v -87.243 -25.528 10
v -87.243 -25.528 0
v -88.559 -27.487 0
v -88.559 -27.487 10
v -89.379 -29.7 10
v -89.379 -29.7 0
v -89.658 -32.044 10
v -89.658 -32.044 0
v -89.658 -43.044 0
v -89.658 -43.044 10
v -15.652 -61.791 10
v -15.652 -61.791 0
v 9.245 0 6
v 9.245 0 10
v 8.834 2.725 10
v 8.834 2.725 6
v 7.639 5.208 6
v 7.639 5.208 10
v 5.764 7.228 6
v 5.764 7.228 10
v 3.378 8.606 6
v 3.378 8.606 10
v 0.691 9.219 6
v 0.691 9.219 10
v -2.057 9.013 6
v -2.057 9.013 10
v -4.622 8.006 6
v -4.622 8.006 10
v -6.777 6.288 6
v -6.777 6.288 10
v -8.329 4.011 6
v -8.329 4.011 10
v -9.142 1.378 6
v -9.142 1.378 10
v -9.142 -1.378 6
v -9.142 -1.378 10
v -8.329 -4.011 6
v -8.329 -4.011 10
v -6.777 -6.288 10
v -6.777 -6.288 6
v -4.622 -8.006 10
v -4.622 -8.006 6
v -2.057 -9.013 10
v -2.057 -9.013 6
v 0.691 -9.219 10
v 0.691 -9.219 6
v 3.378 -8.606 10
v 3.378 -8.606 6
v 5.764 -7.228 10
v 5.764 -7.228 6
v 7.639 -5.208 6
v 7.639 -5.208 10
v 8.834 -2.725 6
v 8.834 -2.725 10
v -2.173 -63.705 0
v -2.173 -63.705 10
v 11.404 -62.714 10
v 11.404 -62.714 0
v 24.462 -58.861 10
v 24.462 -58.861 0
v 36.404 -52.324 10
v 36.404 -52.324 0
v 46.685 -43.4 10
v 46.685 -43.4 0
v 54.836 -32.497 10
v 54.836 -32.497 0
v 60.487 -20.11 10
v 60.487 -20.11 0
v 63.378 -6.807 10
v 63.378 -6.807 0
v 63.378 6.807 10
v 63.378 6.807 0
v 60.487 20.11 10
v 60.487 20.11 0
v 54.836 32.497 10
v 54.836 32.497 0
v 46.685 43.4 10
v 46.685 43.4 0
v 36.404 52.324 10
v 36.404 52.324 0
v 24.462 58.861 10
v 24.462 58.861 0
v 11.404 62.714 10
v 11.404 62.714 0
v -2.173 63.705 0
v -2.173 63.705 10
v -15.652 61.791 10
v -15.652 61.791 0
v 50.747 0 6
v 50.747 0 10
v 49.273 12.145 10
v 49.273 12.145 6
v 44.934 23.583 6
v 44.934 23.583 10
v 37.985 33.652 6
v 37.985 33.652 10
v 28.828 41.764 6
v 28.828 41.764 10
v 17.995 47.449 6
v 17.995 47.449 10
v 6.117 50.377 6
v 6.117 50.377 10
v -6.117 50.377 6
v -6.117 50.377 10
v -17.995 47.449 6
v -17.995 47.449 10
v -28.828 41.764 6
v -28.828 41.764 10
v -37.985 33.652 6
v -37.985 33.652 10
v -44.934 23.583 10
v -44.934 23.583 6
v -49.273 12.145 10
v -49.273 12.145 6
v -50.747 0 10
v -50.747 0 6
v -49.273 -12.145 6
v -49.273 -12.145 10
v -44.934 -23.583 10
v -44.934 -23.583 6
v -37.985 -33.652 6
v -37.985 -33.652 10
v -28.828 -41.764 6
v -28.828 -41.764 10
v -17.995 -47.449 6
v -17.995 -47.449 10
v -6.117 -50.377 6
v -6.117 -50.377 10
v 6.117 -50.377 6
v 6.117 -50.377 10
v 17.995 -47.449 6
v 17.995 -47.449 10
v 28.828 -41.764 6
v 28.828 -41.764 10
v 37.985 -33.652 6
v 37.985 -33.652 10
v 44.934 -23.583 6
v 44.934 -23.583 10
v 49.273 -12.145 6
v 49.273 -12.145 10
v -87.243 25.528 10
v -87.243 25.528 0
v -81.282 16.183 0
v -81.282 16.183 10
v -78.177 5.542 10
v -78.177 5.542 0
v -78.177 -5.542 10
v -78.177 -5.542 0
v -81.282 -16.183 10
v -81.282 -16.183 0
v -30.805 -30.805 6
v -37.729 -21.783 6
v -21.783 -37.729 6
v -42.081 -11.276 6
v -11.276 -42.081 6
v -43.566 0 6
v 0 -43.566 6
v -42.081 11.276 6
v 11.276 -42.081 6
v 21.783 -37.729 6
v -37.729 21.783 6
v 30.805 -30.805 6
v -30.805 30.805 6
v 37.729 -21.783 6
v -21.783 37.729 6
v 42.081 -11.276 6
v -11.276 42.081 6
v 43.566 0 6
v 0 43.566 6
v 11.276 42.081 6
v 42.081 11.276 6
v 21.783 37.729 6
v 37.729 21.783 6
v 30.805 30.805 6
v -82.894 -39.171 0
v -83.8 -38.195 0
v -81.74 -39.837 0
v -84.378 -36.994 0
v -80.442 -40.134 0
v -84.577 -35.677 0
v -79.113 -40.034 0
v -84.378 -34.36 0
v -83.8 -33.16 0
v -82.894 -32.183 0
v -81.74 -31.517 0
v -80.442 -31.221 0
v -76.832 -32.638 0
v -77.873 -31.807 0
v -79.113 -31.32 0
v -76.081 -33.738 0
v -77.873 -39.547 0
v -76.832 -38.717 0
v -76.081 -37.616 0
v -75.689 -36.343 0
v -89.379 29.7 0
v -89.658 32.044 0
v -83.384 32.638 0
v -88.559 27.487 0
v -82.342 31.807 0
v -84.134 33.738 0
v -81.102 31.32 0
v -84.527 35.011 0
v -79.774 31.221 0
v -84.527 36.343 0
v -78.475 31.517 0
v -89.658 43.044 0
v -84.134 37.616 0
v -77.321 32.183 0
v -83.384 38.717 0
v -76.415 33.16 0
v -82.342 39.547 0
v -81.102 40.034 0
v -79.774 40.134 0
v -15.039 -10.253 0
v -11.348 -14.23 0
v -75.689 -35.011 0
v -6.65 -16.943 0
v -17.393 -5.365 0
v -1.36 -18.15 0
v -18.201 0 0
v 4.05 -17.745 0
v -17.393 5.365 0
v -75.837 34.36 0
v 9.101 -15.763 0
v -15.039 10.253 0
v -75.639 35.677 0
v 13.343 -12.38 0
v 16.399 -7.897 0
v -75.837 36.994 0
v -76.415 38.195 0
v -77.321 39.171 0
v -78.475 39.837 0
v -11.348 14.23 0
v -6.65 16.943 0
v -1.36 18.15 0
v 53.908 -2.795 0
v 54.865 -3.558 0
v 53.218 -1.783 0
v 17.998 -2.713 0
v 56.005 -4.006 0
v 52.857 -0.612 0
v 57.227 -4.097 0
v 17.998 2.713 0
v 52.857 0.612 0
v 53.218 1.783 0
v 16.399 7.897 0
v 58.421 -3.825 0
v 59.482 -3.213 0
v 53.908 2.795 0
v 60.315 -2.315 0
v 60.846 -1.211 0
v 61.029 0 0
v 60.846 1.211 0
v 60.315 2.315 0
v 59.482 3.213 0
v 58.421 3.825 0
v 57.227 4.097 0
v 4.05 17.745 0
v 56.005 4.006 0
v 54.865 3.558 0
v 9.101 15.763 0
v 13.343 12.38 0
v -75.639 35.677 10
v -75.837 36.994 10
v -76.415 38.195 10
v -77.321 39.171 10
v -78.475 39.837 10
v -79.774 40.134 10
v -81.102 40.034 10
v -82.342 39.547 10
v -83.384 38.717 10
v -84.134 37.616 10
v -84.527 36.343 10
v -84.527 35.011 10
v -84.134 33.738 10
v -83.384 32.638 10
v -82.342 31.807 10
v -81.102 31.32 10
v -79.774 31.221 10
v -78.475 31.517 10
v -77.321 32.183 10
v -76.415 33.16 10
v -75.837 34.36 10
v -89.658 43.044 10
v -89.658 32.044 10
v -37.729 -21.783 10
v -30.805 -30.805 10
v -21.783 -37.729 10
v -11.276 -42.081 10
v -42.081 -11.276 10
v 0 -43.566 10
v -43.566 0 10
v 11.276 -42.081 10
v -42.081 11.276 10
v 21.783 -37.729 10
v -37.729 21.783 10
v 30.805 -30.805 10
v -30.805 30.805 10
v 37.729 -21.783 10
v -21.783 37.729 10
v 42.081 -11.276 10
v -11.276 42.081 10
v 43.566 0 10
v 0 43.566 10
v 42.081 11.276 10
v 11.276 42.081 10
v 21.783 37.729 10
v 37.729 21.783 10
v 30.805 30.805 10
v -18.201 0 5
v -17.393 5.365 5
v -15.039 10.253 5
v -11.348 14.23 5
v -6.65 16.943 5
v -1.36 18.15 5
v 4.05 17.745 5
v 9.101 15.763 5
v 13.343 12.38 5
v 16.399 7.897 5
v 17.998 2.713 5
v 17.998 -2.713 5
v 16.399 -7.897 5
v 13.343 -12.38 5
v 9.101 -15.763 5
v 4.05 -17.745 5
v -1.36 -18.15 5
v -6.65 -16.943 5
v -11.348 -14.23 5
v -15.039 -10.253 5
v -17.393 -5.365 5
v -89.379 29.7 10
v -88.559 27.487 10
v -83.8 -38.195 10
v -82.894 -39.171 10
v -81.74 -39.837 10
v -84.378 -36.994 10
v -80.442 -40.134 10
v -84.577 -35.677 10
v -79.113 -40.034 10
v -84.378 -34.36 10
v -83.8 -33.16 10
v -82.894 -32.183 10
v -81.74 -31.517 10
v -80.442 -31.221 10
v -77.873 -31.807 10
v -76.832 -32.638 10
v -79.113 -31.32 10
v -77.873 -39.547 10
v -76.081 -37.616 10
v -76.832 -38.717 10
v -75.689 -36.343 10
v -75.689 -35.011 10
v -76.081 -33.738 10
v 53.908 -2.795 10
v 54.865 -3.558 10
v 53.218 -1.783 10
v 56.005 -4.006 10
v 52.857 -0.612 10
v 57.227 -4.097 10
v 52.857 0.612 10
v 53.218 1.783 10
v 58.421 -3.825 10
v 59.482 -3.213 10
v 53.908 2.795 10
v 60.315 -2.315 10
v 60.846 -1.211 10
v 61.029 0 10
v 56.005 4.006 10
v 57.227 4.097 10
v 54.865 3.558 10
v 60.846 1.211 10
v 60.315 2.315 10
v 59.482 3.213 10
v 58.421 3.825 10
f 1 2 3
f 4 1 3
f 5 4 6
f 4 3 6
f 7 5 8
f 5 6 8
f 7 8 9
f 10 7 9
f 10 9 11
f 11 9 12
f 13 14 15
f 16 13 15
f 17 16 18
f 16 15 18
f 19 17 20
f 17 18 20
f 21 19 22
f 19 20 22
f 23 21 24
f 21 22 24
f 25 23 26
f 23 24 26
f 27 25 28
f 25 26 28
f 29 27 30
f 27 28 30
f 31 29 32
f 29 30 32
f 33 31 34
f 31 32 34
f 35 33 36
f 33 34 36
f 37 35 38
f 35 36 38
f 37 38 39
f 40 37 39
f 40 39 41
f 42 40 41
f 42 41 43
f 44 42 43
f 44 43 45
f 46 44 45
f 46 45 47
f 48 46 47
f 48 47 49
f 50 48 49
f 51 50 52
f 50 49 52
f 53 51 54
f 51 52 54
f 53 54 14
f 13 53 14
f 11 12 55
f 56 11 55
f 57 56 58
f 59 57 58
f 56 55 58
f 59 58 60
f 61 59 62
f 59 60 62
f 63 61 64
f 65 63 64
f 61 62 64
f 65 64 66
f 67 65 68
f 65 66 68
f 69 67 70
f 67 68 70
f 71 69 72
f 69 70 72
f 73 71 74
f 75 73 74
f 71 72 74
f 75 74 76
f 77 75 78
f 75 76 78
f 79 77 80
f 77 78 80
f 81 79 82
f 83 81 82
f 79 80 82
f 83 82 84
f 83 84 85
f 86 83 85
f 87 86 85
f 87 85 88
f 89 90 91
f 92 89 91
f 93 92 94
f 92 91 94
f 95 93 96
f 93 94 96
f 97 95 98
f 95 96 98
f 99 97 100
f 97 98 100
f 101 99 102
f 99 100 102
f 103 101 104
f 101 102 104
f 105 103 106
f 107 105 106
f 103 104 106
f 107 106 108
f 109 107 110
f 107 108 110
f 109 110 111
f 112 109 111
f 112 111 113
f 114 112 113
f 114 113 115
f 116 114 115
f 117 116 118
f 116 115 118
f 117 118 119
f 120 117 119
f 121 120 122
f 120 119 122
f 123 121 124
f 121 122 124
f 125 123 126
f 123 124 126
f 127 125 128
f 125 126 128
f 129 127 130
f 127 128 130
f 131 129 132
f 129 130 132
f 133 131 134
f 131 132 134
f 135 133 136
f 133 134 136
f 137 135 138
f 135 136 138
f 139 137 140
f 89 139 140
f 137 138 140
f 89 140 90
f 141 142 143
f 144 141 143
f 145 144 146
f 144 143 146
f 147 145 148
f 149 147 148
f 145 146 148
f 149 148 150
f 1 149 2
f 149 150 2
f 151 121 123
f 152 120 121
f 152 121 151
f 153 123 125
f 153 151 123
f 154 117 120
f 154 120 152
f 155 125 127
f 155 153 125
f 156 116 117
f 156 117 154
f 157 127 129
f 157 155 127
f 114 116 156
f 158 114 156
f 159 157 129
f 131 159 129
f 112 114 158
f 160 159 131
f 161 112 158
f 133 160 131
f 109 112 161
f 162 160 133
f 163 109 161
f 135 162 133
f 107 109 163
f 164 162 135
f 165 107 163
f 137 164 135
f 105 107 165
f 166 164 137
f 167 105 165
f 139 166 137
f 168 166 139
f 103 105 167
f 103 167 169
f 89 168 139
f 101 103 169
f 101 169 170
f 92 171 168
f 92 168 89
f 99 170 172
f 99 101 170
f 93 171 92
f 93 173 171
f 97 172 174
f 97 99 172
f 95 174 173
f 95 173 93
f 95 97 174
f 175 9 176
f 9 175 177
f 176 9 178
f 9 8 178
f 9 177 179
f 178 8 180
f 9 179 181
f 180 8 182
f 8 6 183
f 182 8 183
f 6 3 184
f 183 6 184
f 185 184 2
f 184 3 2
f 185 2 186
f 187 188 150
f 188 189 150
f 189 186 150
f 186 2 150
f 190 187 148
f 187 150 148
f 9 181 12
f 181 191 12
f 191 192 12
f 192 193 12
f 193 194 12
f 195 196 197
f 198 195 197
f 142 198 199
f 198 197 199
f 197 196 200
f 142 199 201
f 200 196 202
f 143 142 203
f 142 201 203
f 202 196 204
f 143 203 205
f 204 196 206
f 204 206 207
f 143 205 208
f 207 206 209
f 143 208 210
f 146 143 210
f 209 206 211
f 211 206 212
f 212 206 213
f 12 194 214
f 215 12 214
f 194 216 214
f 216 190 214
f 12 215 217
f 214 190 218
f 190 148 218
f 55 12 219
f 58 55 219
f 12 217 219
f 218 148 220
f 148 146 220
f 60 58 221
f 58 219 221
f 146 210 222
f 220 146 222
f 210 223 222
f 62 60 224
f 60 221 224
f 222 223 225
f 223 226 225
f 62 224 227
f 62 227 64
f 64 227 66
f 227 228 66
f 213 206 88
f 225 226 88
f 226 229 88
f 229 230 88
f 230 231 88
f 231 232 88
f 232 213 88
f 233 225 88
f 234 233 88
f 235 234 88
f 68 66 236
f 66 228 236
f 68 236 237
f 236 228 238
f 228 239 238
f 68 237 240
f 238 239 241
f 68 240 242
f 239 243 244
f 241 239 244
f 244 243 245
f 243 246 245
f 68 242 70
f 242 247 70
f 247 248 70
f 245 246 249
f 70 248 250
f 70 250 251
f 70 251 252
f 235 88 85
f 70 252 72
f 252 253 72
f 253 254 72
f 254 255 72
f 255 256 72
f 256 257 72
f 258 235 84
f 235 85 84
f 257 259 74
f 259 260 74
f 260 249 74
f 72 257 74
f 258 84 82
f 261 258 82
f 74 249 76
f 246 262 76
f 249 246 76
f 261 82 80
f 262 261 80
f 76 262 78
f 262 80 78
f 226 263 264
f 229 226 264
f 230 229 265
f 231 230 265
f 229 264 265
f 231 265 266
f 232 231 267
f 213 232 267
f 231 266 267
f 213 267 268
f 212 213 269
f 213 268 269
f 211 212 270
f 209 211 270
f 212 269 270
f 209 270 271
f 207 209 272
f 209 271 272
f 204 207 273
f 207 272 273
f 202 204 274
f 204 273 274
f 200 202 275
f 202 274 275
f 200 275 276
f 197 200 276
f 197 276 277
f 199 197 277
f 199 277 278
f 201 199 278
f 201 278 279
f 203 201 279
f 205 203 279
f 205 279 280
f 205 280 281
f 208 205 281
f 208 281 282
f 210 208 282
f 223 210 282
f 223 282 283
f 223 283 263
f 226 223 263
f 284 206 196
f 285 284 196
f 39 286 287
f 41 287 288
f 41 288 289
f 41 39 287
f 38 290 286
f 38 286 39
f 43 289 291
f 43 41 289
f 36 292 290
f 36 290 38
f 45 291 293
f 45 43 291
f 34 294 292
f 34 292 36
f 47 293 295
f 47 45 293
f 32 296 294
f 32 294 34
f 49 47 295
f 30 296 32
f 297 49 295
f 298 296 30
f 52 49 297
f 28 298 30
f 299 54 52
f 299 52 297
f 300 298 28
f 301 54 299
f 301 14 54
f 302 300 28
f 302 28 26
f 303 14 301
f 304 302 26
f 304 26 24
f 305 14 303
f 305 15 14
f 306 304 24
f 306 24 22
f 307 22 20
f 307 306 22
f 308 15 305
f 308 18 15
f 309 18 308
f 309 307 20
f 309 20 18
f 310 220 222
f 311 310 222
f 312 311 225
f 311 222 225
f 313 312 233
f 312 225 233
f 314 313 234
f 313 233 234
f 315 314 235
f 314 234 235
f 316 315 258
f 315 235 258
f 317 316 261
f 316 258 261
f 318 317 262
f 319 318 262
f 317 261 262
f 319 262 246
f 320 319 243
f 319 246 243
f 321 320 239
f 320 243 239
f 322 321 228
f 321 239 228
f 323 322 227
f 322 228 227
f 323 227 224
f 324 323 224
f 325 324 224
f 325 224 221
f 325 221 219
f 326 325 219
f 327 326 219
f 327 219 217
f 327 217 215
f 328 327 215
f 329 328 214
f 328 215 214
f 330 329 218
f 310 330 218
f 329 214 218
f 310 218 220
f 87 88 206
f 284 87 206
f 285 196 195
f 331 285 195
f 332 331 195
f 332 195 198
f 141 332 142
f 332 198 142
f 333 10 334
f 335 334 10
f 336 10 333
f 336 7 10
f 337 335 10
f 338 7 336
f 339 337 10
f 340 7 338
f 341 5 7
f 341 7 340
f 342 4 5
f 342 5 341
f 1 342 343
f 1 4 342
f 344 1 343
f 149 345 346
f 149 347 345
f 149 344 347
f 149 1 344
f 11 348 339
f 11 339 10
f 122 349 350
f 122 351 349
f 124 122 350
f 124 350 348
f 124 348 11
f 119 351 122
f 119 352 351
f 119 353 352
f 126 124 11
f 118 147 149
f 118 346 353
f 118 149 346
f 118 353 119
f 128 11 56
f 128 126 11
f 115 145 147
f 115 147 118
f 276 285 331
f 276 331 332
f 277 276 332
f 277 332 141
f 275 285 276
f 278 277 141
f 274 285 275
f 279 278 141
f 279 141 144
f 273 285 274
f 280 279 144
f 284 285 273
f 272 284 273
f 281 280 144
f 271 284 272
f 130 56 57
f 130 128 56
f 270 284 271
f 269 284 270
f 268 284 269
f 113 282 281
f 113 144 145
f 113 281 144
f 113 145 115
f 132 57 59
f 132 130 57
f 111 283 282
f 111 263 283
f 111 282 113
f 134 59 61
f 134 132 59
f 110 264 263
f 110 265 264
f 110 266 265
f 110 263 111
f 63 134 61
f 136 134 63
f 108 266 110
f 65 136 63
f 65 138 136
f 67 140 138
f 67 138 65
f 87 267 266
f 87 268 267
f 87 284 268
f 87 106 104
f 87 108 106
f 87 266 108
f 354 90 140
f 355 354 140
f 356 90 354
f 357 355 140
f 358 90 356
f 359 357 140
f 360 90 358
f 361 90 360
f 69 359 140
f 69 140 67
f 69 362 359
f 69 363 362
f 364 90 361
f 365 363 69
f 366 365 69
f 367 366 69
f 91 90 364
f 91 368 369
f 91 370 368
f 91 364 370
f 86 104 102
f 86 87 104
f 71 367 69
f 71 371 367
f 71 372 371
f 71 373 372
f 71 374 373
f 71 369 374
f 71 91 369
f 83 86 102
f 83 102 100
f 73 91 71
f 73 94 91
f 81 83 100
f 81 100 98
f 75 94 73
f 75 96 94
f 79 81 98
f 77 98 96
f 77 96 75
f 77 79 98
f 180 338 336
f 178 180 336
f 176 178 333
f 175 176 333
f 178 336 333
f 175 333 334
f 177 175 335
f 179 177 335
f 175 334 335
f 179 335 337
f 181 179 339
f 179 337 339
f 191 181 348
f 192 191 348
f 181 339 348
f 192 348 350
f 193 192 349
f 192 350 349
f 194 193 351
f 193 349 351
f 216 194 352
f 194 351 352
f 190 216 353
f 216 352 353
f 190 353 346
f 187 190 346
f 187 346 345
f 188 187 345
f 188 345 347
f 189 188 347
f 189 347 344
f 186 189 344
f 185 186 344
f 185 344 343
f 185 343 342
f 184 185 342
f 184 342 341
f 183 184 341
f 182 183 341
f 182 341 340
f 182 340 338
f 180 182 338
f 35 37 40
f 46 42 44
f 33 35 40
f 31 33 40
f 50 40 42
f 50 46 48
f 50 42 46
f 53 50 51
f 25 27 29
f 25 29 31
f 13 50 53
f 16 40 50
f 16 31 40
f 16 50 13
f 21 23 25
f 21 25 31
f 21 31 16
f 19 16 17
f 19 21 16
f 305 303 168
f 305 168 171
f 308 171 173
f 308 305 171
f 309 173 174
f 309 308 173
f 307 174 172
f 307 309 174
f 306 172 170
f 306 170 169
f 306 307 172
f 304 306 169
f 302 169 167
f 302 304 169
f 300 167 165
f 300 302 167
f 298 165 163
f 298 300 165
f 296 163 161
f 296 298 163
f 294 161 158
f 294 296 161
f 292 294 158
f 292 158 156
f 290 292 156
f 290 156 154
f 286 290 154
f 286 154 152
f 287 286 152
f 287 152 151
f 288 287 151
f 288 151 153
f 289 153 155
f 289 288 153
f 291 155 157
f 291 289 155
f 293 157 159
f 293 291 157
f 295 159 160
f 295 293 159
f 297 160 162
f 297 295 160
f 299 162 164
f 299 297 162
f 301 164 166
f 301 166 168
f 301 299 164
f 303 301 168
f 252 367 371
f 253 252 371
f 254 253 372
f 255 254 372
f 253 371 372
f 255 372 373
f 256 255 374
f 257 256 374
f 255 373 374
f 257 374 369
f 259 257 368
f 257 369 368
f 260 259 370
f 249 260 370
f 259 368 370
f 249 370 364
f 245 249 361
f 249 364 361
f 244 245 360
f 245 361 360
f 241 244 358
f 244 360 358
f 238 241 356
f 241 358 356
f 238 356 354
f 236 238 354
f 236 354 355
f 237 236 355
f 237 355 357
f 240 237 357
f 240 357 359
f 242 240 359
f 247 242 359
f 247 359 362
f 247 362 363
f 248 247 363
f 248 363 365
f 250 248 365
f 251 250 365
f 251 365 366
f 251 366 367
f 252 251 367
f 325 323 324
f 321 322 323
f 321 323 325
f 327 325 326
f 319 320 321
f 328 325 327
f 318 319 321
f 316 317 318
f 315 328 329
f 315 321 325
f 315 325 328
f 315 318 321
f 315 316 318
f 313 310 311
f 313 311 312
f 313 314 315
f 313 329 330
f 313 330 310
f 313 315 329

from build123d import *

# Parameters (mm, degrees)
EXTRUDE_1_DEPTH     = 10
SKETCH_2_R          = 4.468909074
SKETCH_2_R_2        = 4.108968286
CUT_EXTRUDE_1_DEPTH = 111.460779809
SKETCH_3_R          = 50.74720983
SKETCH_3_R_2        = 43.56554387
CUT_EXTRUDE_3_DEPTH = 4
SKETCH_4_R          = 9.24493497
CUT_EXTRUDE_4_DEPTH = 4
SKETCH_5_R          = 18.201318997
CUT_EXTRUDE_5_DEPTH = 5


with BuildPart() as part:
    # 草图1 → 凸台-拉伸1 (new body)
    with BuildSketch(Plane.XY):
        with BuildLine():
            Line((-89.657800503, -43.044325296), (-15.652055073, -61.790580648))
            ThreePointArc((-15.652055073, -61.790580648), (63.74215783, 0), (-15.652055073, 61.790580648))
            Line((-15.652055073, 61.790580648), (-89.657800503, 43.044325296))
            Line((-89.657800503, 43.044325296), (-89.657800503, 32.044242854))
            ThreePointArc((-89.657800503, 32.044242854), (-89.034636537, 28.569340555), (-87.242811306, 25.527525035))
            ThreePointArc((-87.242811306, 25.527525035), (-77.782727423, 0), (-87.242811306, -25.527525035))
            ThreePointArc((-87.242811306, -25.527525035), (-89.034636537, -28.569340555), (-89.657800503, -32.044242854))
            Line((-89.657800503, -32.044242854), (-89.657800503, -43.044325296))
        make_face()
    extrude(amount=EXTRUDE_1_DEPTH)

    # 草图2 → 切除-拉伸1 (cut, through all)
    with BuildSketch(Plane.XY.offset(10)):
        with Locations((-80.107707578, 35.677130973)):
            Circle(SKETCH_2_R)
        with Locations(Location((-80.107707578, -35.677130973, 0), (0, 0, 180))):
            Circle(SKETCH_2_R)
        with Locations((56.919679182, 0)):
            Circle(SKETCH_2_R_2)
    extrude(amount=-CUT_EXTRUDE_1_DEPTH, mode=Mode.SUBTRACT)

    # 草图3 → 切除-拉伸3 (cut)
    with BuildSketch(Plane.XY.offset(10)):
        Circle(SKETCH_3_R)
        Circle(SKETCH_3_R_2, mode=Mode.SUBTRACT)
    extrude(amount=-CUT_EXTRUDE_3_DEPTH, mode=Mode.SUBTRACT)

    # 草图4 → 切除-拉伸4 (cut)
    with BuildSketch(Plane.XY.offset(10)):
        Circle(SKETCH_4_R)
    extrude(amount=-CUT_EXTRUDE_4_DEPTH, mode=Mode.SUBTRACT)

    # 草图5 → 切除-拉伸5 (cut)
    with BuildSketch(Plane(origin=(0, 0, 0), x_dir=(-1, 0, 0), z_dir=(0, 0, -1))):
        Circle(SKETCH_5_R)
    extrude(amount=-CUT_EXTRUDE_5_DEPTH, mode=Mode.SUBTRACT)


solid = part.part
